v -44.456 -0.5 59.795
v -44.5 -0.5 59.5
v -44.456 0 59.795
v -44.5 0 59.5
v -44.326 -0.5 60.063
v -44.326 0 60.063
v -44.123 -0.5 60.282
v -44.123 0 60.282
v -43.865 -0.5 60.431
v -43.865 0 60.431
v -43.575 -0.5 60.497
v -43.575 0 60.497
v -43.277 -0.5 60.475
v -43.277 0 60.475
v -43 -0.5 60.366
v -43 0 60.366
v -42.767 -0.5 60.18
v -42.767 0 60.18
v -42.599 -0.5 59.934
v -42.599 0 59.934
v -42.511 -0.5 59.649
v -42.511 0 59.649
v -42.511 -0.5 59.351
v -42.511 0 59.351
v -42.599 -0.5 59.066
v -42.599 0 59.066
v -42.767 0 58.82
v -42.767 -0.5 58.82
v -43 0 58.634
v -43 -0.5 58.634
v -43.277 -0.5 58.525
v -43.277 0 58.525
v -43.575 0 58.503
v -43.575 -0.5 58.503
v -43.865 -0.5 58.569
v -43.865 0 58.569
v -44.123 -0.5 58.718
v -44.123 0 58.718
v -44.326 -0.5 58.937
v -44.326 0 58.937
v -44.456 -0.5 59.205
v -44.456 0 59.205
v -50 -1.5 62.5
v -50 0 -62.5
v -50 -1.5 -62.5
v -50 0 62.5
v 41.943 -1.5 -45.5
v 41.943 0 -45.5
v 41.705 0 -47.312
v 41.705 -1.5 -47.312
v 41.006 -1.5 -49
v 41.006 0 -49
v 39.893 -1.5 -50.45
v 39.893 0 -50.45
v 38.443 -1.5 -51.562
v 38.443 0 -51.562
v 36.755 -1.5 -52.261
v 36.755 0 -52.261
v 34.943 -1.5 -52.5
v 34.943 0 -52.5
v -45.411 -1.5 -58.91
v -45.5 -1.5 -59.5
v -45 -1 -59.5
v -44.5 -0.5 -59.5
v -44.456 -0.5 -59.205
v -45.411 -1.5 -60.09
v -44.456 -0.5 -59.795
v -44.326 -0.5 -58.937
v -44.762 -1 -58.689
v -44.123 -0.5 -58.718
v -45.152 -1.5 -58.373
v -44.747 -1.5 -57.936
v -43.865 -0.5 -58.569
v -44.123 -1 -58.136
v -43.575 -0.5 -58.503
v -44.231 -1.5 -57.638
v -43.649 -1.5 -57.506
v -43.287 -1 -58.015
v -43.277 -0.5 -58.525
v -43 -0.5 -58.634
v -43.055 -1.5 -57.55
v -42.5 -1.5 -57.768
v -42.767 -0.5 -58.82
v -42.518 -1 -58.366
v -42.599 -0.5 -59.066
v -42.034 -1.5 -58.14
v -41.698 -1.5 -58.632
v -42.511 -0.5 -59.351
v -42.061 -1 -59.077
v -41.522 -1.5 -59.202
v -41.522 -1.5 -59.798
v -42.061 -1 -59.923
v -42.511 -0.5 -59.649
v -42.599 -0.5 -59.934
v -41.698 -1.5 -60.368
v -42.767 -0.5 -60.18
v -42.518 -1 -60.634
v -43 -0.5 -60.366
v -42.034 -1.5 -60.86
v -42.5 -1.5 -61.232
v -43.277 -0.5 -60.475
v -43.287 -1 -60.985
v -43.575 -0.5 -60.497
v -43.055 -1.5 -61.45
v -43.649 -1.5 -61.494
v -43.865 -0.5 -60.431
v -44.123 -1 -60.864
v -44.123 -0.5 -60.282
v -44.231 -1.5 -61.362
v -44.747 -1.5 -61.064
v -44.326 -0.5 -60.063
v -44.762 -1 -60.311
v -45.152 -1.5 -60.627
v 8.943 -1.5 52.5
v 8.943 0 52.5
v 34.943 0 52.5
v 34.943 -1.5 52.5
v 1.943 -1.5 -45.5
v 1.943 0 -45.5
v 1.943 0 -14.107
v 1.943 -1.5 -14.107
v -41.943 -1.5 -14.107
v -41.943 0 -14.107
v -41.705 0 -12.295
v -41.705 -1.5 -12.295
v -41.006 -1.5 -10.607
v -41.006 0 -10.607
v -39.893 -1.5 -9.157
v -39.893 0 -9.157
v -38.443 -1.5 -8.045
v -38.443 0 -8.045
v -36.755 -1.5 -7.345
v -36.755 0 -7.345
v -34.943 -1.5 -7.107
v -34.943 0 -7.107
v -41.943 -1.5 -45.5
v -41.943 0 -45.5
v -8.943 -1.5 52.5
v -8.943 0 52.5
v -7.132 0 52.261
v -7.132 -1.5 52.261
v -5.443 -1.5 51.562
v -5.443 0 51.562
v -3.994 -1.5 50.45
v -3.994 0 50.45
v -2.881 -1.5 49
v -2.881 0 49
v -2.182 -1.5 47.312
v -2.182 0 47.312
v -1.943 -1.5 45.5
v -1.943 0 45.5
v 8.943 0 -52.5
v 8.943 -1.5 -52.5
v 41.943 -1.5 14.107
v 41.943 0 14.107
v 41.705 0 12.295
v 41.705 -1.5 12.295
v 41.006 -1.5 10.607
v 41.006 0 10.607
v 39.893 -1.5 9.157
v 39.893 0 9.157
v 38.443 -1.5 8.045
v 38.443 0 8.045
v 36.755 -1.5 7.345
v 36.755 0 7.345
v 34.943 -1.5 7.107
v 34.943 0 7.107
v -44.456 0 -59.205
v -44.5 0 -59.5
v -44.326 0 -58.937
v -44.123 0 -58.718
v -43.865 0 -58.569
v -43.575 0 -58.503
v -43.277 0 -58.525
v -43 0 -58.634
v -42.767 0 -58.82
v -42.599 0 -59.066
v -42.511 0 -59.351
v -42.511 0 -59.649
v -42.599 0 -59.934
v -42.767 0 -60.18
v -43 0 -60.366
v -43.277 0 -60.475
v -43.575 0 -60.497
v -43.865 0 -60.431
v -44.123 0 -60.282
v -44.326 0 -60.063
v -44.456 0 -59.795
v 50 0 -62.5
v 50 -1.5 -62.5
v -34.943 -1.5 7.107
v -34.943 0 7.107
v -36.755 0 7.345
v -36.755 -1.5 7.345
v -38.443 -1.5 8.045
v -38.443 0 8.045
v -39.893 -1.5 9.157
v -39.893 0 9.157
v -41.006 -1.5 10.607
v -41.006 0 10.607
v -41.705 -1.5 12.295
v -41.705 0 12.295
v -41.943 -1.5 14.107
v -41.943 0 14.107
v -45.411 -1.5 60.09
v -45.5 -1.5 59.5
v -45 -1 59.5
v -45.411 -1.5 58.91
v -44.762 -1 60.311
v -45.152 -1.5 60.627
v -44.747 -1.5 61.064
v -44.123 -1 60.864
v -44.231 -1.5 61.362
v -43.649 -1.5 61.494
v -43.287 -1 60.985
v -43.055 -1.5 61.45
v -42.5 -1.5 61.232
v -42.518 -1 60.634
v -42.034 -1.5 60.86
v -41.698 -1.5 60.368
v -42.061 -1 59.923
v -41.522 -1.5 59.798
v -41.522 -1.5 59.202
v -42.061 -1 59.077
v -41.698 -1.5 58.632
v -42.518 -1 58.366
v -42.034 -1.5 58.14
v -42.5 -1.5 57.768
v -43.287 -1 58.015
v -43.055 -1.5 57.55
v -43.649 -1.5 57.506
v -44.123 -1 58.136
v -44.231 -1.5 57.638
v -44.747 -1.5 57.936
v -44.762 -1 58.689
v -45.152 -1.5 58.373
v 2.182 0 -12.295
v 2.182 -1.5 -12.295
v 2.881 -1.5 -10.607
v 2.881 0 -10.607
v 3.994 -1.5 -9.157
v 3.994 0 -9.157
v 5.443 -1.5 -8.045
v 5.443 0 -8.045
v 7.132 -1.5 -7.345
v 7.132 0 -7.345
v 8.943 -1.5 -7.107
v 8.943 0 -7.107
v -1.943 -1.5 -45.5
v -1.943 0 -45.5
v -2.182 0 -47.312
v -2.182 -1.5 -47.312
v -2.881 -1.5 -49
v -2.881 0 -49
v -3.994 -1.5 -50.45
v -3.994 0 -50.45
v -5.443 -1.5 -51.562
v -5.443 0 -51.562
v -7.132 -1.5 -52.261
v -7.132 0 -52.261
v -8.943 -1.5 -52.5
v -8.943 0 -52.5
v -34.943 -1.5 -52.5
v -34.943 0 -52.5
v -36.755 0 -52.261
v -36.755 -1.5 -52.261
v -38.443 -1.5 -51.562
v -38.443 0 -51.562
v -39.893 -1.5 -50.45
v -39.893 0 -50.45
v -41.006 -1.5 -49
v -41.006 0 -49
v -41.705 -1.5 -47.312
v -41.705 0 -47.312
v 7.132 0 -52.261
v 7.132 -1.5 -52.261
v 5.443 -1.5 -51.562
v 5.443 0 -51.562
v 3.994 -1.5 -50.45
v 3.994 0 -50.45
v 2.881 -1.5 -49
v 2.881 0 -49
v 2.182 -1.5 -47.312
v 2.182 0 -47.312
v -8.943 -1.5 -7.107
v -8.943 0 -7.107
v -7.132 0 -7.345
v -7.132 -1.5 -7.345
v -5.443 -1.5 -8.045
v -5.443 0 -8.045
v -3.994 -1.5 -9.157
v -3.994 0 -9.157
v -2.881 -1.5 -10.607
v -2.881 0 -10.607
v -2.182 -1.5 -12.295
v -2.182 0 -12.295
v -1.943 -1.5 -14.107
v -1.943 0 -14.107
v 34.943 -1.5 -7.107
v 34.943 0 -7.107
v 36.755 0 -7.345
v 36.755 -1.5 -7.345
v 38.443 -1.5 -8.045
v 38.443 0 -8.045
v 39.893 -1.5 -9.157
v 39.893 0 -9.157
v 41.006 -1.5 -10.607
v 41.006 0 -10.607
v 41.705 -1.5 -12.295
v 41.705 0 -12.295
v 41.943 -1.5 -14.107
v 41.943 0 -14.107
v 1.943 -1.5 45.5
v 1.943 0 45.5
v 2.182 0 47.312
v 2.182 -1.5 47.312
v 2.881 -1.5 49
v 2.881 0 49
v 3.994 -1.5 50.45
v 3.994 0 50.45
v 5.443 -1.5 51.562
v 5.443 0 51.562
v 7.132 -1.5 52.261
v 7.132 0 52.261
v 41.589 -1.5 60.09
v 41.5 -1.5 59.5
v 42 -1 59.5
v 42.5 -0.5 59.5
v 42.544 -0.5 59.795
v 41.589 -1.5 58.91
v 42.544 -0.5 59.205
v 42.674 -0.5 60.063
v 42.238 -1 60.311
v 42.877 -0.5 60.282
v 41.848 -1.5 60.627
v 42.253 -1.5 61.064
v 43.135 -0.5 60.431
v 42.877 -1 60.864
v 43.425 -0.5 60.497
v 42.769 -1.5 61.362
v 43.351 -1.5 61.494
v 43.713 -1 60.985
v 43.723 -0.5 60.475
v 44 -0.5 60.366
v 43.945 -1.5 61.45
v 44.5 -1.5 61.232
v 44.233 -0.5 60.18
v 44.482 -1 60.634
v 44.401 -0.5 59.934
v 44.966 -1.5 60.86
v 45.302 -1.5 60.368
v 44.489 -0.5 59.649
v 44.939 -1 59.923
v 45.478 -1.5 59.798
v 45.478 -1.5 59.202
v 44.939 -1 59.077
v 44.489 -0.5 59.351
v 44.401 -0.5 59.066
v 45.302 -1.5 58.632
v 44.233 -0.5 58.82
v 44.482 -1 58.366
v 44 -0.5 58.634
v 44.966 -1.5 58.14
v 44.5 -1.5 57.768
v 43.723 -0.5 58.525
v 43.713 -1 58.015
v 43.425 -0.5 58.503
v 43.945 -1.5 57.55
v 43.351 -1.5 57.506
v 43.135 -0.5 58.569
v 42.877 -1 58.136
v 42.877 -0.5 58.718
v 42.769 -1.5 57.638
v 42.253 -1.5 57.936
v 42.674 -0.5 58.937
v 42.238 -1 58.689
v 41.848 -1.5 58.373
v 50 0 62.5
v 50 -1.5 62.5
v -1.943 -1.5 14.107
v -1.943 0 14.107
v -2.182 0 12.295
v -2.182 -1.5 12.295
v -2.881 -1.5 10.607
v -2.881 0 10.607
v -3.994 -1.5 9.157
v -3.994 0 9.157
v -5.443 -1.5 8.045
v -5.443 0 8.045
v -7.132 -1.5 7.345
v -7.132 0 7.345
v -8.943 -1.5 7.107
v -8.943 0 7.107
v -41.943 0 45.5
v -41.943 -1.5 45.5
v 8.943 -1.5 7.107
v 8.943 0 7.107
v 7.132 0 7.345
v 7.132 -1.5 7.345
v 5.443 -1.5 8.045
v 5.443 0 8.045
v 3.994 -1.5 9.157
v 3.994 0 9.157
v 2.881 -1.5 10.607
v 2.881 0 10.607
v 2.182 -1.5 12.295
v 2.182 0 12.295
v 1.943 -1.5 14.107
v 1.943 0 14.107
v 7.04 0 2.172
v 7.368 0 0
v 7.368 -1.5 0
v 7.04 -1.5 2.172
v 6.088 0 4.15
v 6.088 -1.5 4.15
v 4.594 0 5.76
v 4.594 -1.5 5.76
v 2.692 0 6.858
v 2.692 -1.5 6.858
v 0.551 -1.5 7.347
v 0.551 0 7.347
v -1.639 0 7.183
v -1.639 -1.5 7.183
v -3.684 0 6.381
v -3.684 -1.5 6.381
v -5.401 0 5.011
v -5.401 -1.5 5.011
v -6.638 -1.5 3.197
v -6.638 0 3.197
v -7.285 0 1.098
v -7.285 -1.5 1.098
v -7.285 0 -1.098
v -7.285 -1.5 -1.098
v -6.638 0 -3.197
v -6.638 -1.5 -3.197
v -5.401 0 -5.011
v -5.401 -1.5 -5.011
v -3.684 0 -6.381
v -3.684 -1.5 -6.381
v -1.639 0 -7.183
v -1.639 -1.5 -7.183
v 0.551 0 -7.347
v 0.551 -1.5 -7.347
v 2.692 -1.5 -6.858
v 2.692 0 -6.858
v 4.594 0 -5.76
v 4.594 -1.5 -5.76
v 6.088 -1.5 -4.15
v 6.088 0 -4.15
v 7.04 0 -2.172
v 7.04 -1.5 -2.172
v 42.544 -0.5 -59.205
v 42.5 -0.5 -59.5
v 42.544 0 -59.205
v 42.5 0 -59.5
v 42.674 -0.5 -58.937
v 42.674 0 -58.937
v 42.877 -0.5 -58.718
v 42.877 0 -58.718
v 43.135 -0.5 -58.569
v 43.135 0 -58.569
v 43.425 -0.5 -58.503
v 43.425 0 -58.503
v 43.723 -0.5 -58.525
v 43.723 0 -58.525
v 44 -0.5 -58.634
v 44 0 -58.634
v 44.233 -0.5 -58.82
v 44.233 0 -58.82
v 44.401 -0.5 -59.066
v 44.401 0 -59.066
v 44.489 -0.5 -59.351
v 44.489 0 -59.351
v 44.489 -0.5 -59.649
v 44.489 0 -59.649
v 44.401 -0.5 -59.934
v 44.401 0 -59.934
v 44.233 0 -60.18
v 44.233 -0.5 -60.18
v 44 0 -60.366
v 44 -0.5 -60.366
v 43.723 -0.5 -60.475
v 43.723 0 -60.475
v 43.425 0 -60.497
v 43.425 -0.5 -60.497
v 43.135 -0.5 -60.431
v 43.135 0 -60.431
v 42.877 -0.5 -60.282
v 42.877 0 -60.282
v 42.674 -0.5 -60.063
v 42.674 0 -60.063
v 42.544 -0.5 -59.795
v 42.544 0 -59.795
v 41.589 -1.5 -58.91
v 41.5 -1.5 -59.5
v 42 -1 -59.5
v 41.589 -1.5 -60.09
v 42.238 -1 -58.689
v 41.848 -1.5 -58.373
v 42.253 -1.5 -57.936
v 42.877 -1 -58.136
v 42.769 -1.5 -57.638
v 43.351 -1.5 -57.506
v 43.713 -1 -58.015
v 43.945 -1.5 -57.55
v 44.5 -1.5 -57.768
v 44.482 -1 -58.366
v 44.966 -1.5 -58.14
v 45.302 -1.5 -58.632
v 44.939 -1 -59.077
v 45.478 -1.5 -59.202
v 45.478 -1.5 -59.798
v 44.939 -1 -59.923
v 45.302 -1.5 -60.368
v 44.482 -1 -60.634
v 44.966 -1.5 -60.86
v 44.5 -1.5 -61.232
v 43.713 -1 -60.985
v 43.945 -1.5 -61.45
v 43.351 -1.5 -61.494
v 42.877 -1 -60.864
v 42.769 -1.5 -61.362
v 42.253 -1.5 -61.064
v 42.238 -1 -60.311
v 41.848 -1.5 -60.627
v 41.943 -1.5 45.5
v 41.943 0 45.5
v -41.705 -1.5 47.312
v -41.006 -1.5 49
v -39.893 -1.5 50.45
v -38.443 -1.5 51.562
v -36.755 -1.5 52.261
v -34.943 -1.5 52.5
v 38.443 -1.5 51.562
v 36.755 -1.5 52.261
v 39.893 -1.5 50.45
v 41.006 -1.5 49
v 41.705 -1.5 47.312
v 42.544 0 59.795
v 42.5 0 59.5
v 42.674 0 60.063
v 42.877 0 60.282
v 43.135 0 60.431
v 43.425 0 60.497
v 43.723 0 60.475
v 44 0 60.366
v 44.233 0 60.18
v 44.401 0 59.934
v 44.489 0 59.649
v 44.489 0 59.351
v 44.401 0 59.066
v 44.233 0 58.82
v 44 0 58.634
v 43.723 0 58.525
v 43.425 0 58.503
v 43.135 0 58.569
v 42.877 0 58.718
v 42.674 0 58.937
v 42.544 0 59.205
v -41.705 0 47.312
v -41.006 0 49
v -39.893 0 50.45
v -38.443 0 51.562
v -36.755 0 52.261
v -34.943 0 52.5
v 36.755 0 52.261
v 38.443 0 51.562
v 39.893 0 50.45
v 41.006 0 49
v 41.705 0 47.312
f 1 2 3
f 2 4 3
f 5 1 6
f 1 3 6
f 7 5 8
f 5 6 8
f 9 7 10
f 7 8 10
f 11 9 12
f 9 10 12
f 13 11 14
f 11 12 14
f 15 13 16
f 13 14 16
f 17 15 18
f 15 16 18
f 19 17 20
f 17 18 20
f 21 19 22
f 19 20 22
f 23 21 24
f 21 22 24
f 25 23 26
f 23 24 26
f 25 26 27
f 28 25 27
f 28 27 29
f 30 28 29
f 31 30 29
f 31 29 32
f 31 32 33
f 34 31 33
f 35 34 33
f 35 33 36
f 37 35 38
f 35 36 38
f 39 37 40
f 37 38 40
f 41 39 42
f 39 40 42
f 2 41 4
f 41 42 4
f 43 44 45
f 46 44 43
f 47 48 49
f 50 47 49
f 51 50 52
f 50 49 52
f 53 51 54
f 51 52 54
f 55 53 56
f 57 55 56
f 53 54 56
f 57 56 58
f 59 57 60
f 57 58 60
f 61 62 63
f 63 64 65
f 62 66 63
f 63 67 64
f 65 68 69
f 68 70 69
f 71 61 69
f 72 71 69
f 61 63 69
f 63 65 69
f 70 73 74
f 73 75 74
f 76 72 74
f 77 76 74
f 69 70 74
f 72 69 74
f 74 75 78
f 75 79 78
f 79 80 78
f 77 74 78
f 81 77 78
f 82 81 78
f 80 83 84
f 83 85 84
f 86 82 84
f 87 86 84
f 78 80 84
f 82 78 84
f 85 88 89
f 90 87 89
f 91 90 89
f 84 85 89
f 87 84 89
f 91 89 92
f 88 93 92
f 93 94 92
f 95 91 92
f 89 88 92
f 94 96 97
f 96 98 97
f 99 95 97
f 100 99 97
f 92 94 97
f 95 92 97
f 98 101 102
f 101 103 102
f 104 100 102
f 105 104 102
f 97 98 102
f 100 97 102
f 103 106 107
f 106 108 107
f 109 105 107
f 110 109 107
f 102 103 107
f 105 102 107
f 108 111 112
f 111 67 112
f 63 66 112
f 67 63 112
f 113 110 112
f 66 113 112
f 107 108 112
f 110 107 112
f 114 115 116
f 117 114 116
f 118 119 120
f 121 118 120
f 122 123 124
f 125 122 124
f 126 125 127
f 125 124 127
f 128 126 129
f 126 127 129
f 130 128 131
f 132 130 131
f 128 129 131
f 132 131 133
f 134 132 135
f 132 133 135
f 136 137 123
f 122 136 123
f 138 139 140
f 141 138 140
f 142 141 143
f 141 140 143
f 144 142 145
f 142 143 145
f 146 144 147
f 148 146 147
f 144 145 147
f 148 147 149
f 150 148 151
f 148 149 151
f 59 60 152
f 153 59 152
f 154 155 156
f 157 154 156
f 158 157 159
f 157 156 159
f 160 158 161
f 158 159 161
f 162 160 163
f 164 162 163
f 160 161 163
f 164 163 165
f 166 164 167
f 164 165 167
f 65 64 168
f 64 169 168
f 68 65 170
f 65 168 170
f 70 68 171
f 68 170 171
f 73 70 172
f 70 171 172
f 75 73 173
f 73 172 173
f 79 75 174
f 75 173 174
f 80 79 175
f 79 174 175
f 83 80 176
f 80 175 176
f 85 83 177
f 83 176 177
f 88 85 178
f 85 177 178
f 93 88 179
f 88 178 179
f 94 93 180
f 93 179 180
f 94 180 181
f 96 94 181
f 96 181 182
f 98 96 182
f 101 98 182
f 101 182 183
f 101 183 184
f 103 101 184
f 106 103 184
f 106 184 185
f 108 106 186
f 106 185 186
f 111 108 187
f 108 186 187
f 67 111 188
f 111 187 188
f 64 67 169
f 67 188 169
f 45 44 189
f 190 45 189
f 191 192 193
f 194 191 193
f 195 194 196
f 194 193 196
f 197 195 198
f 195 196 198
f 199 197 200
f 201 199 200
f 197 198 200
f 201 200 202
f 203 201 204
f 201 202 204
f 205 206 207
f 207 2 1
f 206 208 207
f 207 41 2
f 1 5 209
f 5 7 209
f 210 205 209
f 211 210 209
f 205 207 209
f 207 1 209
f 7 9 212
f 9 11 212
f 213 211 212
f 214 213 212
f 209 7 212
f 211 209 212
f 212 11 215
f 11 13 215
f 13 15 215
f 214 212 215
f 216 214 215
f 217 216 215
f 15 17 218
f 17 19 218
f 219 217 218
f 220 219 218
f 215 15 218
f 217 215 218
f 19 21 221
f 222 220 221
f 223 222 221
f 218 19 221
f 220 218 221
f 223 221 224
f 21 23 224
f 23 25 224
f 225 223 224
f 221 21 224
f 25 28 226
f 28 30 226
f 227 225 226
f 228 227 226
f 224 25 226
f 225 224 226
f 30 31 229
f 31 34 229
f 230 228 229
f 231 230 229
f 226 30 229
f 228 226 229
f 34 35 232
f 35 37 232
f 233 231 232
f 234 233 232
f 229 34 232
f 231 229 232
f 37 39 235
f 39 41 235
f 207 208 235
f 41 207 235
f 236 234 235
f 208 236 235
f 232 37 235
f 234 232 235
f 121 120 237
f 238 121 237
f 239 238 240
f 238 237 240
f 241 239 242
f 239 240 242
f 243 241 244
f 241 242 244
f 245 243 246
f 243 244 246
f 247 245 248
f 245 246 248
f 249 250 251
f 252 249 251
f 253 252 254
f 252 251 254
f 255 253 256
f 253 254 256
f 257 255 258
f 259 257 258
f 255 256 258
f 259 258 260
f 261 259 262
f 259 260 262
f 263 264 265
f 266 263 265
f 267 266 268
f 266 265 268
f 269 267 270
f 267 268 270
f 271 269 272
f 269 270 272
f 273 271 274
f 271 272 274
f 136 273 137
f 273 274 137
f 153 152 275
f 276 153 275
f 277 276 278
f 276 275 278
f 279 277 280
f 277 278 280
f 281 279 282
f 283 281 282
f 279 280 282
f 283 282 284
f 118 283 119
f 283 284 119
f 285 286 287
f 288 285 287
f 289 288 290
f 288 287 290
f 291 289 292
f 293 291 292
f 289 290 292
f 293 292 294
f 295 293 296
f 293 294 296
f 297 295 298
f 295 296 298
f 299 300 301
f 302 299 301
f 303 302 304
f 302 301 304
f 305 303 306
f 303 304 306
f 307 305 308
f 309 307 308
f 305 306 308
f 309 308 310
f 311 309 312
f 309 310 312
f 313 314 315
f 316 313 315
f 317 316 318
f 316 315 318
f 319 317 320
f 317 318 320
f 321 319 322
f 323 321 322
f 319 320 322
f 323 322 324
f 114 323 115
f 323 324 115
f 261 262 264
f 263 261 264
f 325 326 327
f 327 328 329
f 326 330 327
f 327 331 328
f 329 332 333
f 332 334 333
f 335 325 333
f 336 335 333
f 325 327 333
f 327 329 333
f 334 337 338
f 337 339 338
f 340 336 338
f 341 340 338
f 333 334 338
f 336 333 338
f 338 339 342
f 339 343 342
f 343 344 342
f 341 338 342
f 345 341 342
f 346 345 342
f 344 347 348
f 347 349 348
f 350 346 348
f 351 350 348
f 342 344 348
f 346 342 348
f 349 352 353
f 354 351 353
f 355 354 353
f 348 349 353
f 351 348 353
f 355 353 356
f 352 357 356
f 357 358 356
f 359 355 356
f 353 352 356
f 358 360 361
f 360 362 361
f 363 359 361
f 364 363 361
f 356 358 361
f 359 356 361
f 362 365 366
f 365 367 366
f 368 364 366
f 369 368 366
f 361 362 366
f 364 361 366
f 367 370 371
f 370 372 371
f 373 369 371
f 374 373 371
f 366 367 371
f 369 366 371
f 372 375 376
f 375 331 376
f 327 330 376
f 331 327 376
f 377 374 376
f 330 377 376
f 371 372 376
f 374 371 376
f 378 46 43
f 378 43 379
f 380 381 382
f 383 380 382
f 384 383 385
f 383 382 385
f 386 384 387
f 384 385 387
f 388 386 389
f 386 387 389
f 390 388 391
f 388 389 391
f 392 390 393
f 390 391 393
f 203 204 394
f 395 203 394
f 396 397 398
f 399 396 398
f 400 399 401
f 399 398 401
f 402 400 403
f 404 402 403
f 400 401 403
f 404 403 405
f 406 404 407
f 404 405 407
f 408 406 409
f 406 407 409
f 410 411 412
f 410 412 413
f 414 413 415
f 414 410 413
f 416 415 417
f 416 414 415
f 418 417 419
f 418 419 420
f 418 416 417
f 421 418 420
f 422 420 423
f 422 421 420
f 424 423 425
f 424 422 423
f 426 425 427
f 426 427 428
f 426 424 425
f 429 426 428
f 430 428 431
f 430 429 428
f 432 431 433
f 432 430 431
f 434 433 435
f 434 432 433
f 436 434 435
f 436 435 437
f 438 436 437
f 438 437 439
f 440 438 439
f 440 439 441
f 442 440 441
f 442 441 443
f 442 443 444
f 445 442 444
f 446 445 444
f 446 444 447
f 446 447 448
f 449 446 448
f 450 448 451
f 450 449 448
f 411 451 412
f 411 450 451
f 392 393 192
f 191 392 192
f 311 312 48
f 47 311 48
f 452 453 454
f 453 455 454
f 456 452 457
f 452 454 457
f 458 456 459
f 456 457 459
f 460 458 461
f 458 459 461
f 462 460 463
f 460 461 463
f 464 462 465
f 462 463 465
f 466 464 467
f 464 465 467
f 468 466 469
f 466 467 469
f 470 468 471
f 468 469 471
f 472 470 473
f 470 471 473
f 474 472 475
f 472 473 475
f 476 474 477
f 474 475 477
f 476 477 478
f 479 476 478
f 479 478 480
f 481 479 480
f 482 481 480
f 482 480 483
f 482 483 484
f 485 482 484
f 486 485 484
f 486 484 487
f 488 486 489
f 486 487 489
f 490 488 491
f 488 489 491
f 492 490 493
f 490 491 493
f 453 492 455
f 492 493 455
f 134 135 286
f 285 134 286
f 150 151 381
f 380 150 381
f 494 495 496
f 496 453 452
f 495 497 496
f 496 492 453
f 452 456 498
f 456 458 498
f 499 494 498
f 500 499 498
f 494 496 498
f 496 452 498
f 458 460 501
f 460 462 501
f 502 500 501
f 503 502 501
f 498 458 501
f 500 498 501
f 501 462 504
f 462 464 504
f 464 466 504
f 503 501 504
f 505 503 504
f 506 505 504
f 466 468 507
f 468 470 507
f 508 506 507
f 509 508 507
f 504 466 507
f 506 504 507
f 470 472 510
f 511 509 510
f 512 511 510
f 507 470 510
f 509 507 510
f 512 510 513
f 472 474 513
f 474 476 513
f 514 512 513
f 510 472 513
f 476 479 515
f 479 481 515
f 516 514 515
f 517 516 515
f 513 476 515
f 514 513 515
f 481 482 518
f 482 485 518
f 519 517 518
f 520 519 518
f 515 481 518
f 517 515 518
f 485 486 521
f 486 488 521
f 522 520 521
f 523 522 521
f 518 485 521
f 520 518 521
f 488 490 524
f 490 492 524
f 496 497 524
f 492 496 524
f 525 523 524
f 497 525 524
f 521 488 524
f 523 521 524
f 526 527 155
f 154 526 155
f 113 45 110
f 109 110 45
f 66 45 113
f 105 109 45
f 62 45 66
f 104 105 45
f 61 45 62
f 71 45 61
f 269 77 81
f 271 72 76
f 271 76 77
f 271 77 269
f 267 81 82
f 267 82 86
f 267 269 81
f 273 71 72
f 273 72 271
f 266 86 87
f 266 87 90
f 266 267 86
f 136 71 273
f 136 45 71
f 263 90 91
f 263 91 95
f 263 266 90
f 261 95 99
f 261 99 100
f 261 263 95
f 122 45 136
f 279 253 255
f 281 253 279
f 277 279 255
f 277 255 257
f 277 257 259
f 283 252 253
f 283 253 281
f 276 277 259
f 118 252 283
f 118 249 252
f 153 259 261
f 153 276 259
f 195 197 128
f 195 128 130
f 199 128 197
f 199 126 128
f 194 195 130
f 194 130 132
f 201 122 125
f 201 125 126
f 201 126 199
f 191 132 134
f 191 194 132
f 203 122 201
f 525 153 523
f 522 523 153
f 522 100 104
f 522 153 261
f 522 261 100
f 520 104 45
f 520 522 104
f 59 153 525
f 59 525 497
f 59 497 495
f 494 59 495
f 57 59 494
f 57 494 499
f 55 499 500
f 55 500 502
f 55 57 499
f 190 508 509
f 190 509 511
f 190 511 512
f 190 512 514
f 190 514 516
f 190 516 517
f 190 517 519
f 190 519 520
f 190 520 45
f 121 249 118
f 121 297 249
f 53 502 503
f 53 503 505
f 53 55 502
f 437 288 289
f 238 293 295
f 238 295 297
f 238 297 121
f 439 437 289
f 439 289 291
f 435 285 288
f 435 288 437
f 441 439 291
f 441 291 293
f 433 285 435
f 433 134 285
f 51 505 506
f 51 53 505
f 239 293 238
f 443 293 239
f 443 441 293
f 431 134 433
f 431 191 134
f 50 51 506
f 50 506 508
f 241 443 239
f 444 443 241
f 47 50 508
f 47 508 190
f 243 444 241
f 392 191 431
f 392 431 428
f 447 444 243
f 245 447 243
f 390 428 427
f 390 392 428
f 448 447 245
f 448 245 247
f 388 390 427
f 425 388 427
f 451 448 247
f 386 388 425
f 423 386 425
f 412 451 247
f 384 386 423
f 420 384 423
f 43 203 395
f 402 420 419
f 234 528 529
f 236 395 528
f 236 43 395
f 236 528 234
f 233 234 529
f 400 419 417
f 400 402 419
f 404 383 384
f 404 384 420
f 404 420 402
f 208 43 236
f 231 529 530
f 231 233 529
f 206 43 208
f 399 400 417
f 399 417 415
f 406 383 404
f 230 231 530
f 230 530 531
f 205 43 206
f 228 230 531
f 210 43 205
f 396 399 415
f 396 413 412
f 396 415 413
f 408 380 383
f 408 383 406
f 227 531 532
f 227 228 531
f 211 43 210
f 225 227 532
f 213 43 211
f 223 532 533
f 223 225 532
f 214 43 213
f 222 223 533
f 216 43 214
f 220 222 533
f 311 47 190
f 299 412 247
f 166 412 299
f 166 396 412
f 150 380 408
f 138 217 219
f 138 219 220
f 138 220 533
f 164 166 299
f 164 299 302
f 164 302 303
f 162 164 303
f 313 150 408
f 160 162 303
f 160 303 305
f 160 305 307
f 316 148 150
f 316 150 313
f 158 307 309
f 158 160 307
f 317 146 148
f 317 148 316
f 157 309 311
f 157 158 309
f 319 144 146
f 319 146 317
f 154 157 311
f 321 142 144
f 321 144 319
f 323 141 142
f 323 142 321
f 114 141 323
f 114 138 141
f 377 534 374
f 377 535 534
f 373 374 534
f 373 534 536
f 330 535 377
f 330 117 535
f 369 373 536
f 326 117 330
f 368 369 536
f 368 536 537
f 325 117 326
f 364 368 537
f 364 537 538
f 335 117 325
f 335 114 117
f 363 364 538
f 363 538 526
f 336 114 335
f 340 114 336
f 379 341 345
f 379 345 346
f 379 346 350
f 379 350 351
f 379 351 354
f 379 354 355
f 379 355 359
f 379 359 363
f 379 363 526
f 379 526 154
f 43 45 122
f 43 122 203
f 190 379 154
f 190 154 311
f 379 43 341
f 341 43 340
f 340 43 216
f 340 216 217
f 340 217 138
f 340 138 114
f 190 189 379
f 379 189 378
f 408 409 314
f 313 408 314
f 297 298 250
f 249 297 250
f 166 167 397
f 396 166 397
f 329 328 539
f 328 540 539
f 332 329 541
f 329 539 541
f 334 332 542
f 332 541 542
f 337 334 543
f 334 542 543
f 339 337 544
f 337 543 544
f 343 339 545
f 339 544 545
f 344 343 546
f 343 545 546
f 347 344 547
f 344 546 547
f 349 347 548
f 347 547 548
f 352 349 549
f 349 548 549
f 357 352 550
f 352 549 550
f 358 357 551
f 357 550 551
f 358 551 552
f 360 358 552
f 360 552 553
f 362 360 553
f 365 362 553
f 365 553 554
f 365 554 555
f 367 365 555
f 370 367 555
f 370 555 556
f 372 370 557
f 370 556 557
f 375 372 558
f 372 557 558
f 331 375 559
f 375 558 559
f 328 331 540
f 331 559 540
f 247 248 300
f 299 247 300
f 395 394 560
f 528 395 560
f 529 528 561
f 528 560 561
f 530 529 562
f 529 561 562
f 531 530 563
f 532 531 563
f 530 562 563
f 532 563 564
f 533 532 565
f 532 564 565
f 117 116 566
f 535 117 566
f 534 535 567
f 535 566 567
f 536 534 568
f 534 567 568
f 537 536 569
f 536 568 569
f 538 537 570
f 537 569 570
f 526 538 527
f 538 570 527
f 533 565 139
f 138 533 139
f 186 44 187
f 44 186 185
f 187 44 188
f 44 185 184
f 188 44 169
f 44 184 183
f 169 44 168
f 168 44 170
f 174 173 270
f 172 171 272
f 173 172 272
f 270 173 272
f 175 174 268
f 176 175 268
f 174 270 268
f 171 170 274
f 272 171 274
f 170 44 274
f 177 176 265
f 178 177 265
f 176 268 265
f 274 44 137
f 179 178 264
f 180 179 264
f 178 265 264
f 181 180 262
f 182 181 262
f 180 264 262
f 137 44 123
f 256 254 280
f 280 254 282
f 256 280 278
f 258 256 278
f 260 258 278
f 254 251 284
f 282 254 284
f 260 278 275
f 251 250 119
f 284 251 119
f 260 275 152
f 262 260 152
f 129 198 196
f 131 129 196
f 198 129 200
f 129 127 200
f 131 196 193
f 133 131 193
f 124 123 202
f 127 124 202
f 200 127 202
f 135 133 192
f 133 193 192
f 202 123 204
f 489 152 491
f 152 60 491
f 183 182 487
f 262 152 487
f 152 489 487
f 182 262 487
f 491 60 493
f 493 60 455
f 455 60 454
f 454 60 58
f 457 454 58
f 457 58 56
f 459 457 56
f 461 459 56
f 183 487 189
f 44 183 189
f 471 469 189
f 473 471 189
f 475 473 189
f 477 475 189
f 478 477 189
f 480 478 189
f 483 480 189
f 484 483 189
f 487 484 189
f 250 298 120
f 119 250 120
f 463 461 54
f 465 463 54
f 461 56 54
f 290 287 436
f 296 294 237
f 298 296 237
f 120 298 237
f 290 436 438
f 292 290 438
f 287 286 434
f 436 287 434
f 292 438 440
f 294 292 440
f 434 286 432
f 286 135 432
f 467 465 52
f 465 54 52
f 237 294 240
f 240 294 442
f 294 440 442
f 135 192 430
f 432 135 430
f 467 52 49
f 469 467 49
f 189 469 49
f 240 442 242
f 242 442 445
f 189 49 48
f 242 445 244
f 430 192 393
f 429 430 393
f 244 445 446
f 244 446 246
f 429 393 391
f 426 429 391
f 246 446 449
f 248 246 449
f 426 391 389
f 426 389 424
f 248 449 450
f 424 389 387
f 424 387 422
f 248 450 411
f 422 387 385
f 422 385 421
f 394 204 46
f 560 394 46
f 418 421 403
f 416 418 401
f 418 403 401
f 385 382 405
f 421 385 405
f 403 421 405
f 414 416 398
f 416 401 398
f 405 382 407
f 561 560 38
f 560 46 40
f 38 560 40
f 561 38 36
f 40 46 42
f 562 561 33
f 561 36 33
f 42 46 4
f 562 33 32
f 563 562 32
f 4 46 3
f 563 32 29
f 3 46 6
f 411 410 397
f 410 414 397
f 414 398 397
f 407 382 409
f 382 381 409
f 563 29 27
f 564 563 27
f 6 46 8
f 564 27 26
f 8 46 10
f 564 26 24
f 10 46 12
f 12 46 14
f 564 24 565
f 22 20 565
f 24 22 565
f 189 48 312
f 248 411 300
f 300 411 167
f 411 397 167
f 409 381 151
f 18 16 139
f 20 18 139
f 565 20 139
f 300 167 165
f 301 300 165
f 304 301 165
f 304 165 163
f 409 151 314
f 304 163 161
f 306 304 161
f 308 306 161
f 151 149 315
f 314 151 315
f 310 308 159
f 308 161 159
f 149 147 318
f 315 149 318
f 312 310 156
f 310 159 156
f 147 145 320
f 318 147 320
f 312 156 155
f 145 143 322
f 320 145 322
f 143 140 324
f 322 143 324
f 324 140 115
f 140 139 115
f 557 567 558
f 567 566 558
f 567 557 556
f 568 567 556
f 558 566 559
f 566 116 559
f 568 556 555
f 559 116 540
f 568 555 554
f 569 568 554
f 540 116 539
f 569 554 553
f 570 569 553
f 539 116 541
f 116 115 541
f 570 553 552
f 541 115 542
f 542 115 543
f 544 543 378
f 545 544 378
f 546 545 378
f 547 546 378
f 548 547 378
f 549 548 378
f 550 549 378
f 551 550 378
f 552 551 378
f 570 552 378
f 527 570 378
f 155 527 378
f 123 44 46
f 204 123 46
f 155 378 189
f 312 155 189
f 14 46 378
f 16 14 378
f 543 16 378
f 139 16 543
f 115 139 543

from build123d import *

# Parameters (mm, degrees)
F0_W           = 100
F0_H           = 125
F0_R           = 7.3677826157
F1_DEPTH       = 1.5
F3_D           = 2
F3_CSINK_D     = 4
F3_CSINK_ANGLE = 90


# Not quite as in the source:
# - a feature names something its author has since deleted; it is built from what else it names


with BuildPart() as f1:
    # F0 (on Front) → F1 (new body)
    with BuildSketch(Plane.XZ):
        Rectangle(F0_W, F0_H)
        with BuildLine():
            Line((-34.9434472264, -7.1068441343), (-8.9434472264, -7.1068441343))
            ThreePointArc((-8.9434472264, -7.1068441343), (-3.9936997581, -9.157096666), (-1.9434472264, -14.1068441343))
            Line((-1.9434472264, -14.1068441343), (-1.9434472264, -45.5))
            ThreePointArc((-1.9434472264, -45.5), (-3.9936997581, -50.4497474683), (-8.9434472264, -52.5))
            Line((-8.9434472264, -52.5), (-34.9434472264, -52.5))
            ThreePointArc((-34.9434472264, -52.5), (-39.8931946947, -50.4497474683), (-41.9434472264, -45.5))
            Line((-41.9434472264, -45.5), (-41.9434472264, -14.1068441343))
            ThreePointArc((-41.9434472264, -14.1068441343), (-39.8931946947, -9.157096666), (-34.9434472264, -7.1068441343))
        make_face(mode=Mode.SUBTRACT)
        with BuildLine():
            ThreePointArc((41.9434472264, -45.5), (39.8931946947, -50.4497474683), (34.9434472264, -52.5))
            Line((34.9434472264, -52.5), (8.9434472264, -52.5))
            ThreePointArc((8.9434472264, -52.5), (3.9936997581, -50.4497474683), (1.9434472264, -45.5))
            Line((1.9434472264, -45.5), (1.9434472264, -14.1068441343))
            ThreePointArc((1.9434472264, -14.1068441343), (3.9936997581, -9.157096666), (8.9434472264, -7.1068441343))
            Line((8.9434472264, -7.1068441343), (34.9434472264, -7.1068441343))
            ThreePointArc((34.9434472264, -7.1068441343), (39.8931946947, -9.157096666), (41.9434472264, -14.1068441343))
            Line((41.9434472264, -14.1068441343), (41.9434472264, -45.5))
        make_face(mode=Mode.SUBTRACT)
        with BuildLine():
            ThreePointArc((-1.9434472264, 14.1068441343), (-3.9936997581, 9.157096666), (-8.9434472264, 7.1068441343))
            Line((-8.9434472264, 7.1068441343), (-34.9434472264, 7.1068441343))
            ThreePointArc((-34.9434472264, 7.1068441343), (-39.8931946947, 9.157096666), (-41.9434472264, 14.1068441343))
            Line((-41.9434472264, 14.1068441343), (-41.9434472264, 45.5))
            ThreePointArc((-41.9434472264, 45.5), (-39.8931946947, 50.4497474683), (-34.9434472264, 52.5))
            Line((-34.9434472264, 52.5), (-8.9434472264, 52.5))
            ThreePointArc((-8.9434472264, 52.5), (-3.9936997581, 50.4497474683), (-1.9434472264, 45.5))
            Line((-1.9434472264, 45.5), (-1.9434472264, 14.1068441343))
        make_face(mode=Mode.SUBTRACT)
        Circle(F0_R, mode=Mode.SUBTRACT)
        with BuildLine():
            ThreePointArc((8.9434472264, 7.1068441343), (3.9936997581, 9.157096666), (1.9434472264, 14.1068441343))
            Line((1.9434472264, 14.1068441343), (1.9434472264, 45.5))
            ThreePointArc((1.9434472264, 45.5), (3.9936997581, 50.4497474683), (8.9434472264, 52.5))
            Line((8.9434472264, 52.5), (34.9434472264, 52.5))
            ThreePointArc((34.9434472264, 52.5), (39.8931946947, 50.4497474683), (41.9434472264, 45.5))
            Line((41.9434472264, 45.5), (41.9434472264, 14.1068441343))
            ThreePointArc((41.9434472264, 14.1068441343), (39.8931946947, 9.157096666), (34.9434472264, 7.1068441343))
            Line((34.9434472264, 7.1068441343), (8.9434472264, 7.1068441343))
        make_face(mode=Mode.SUBTRACT)
    extrude(amount=F1_DEPTH)

    # F3 (through all)
    with Locations(Plane.XZ.offset(1.5)):
        with Locations((-43.5, -59.5), (43.5, -59.5), (43.5, 59.5), (-43.5, 59.5)):
            CounterSinkHole(F3_D / 2, F3_CSINK_D / 2, counter_sink_angle=F3_CSINK_ANGLE)


solid = f1.part
